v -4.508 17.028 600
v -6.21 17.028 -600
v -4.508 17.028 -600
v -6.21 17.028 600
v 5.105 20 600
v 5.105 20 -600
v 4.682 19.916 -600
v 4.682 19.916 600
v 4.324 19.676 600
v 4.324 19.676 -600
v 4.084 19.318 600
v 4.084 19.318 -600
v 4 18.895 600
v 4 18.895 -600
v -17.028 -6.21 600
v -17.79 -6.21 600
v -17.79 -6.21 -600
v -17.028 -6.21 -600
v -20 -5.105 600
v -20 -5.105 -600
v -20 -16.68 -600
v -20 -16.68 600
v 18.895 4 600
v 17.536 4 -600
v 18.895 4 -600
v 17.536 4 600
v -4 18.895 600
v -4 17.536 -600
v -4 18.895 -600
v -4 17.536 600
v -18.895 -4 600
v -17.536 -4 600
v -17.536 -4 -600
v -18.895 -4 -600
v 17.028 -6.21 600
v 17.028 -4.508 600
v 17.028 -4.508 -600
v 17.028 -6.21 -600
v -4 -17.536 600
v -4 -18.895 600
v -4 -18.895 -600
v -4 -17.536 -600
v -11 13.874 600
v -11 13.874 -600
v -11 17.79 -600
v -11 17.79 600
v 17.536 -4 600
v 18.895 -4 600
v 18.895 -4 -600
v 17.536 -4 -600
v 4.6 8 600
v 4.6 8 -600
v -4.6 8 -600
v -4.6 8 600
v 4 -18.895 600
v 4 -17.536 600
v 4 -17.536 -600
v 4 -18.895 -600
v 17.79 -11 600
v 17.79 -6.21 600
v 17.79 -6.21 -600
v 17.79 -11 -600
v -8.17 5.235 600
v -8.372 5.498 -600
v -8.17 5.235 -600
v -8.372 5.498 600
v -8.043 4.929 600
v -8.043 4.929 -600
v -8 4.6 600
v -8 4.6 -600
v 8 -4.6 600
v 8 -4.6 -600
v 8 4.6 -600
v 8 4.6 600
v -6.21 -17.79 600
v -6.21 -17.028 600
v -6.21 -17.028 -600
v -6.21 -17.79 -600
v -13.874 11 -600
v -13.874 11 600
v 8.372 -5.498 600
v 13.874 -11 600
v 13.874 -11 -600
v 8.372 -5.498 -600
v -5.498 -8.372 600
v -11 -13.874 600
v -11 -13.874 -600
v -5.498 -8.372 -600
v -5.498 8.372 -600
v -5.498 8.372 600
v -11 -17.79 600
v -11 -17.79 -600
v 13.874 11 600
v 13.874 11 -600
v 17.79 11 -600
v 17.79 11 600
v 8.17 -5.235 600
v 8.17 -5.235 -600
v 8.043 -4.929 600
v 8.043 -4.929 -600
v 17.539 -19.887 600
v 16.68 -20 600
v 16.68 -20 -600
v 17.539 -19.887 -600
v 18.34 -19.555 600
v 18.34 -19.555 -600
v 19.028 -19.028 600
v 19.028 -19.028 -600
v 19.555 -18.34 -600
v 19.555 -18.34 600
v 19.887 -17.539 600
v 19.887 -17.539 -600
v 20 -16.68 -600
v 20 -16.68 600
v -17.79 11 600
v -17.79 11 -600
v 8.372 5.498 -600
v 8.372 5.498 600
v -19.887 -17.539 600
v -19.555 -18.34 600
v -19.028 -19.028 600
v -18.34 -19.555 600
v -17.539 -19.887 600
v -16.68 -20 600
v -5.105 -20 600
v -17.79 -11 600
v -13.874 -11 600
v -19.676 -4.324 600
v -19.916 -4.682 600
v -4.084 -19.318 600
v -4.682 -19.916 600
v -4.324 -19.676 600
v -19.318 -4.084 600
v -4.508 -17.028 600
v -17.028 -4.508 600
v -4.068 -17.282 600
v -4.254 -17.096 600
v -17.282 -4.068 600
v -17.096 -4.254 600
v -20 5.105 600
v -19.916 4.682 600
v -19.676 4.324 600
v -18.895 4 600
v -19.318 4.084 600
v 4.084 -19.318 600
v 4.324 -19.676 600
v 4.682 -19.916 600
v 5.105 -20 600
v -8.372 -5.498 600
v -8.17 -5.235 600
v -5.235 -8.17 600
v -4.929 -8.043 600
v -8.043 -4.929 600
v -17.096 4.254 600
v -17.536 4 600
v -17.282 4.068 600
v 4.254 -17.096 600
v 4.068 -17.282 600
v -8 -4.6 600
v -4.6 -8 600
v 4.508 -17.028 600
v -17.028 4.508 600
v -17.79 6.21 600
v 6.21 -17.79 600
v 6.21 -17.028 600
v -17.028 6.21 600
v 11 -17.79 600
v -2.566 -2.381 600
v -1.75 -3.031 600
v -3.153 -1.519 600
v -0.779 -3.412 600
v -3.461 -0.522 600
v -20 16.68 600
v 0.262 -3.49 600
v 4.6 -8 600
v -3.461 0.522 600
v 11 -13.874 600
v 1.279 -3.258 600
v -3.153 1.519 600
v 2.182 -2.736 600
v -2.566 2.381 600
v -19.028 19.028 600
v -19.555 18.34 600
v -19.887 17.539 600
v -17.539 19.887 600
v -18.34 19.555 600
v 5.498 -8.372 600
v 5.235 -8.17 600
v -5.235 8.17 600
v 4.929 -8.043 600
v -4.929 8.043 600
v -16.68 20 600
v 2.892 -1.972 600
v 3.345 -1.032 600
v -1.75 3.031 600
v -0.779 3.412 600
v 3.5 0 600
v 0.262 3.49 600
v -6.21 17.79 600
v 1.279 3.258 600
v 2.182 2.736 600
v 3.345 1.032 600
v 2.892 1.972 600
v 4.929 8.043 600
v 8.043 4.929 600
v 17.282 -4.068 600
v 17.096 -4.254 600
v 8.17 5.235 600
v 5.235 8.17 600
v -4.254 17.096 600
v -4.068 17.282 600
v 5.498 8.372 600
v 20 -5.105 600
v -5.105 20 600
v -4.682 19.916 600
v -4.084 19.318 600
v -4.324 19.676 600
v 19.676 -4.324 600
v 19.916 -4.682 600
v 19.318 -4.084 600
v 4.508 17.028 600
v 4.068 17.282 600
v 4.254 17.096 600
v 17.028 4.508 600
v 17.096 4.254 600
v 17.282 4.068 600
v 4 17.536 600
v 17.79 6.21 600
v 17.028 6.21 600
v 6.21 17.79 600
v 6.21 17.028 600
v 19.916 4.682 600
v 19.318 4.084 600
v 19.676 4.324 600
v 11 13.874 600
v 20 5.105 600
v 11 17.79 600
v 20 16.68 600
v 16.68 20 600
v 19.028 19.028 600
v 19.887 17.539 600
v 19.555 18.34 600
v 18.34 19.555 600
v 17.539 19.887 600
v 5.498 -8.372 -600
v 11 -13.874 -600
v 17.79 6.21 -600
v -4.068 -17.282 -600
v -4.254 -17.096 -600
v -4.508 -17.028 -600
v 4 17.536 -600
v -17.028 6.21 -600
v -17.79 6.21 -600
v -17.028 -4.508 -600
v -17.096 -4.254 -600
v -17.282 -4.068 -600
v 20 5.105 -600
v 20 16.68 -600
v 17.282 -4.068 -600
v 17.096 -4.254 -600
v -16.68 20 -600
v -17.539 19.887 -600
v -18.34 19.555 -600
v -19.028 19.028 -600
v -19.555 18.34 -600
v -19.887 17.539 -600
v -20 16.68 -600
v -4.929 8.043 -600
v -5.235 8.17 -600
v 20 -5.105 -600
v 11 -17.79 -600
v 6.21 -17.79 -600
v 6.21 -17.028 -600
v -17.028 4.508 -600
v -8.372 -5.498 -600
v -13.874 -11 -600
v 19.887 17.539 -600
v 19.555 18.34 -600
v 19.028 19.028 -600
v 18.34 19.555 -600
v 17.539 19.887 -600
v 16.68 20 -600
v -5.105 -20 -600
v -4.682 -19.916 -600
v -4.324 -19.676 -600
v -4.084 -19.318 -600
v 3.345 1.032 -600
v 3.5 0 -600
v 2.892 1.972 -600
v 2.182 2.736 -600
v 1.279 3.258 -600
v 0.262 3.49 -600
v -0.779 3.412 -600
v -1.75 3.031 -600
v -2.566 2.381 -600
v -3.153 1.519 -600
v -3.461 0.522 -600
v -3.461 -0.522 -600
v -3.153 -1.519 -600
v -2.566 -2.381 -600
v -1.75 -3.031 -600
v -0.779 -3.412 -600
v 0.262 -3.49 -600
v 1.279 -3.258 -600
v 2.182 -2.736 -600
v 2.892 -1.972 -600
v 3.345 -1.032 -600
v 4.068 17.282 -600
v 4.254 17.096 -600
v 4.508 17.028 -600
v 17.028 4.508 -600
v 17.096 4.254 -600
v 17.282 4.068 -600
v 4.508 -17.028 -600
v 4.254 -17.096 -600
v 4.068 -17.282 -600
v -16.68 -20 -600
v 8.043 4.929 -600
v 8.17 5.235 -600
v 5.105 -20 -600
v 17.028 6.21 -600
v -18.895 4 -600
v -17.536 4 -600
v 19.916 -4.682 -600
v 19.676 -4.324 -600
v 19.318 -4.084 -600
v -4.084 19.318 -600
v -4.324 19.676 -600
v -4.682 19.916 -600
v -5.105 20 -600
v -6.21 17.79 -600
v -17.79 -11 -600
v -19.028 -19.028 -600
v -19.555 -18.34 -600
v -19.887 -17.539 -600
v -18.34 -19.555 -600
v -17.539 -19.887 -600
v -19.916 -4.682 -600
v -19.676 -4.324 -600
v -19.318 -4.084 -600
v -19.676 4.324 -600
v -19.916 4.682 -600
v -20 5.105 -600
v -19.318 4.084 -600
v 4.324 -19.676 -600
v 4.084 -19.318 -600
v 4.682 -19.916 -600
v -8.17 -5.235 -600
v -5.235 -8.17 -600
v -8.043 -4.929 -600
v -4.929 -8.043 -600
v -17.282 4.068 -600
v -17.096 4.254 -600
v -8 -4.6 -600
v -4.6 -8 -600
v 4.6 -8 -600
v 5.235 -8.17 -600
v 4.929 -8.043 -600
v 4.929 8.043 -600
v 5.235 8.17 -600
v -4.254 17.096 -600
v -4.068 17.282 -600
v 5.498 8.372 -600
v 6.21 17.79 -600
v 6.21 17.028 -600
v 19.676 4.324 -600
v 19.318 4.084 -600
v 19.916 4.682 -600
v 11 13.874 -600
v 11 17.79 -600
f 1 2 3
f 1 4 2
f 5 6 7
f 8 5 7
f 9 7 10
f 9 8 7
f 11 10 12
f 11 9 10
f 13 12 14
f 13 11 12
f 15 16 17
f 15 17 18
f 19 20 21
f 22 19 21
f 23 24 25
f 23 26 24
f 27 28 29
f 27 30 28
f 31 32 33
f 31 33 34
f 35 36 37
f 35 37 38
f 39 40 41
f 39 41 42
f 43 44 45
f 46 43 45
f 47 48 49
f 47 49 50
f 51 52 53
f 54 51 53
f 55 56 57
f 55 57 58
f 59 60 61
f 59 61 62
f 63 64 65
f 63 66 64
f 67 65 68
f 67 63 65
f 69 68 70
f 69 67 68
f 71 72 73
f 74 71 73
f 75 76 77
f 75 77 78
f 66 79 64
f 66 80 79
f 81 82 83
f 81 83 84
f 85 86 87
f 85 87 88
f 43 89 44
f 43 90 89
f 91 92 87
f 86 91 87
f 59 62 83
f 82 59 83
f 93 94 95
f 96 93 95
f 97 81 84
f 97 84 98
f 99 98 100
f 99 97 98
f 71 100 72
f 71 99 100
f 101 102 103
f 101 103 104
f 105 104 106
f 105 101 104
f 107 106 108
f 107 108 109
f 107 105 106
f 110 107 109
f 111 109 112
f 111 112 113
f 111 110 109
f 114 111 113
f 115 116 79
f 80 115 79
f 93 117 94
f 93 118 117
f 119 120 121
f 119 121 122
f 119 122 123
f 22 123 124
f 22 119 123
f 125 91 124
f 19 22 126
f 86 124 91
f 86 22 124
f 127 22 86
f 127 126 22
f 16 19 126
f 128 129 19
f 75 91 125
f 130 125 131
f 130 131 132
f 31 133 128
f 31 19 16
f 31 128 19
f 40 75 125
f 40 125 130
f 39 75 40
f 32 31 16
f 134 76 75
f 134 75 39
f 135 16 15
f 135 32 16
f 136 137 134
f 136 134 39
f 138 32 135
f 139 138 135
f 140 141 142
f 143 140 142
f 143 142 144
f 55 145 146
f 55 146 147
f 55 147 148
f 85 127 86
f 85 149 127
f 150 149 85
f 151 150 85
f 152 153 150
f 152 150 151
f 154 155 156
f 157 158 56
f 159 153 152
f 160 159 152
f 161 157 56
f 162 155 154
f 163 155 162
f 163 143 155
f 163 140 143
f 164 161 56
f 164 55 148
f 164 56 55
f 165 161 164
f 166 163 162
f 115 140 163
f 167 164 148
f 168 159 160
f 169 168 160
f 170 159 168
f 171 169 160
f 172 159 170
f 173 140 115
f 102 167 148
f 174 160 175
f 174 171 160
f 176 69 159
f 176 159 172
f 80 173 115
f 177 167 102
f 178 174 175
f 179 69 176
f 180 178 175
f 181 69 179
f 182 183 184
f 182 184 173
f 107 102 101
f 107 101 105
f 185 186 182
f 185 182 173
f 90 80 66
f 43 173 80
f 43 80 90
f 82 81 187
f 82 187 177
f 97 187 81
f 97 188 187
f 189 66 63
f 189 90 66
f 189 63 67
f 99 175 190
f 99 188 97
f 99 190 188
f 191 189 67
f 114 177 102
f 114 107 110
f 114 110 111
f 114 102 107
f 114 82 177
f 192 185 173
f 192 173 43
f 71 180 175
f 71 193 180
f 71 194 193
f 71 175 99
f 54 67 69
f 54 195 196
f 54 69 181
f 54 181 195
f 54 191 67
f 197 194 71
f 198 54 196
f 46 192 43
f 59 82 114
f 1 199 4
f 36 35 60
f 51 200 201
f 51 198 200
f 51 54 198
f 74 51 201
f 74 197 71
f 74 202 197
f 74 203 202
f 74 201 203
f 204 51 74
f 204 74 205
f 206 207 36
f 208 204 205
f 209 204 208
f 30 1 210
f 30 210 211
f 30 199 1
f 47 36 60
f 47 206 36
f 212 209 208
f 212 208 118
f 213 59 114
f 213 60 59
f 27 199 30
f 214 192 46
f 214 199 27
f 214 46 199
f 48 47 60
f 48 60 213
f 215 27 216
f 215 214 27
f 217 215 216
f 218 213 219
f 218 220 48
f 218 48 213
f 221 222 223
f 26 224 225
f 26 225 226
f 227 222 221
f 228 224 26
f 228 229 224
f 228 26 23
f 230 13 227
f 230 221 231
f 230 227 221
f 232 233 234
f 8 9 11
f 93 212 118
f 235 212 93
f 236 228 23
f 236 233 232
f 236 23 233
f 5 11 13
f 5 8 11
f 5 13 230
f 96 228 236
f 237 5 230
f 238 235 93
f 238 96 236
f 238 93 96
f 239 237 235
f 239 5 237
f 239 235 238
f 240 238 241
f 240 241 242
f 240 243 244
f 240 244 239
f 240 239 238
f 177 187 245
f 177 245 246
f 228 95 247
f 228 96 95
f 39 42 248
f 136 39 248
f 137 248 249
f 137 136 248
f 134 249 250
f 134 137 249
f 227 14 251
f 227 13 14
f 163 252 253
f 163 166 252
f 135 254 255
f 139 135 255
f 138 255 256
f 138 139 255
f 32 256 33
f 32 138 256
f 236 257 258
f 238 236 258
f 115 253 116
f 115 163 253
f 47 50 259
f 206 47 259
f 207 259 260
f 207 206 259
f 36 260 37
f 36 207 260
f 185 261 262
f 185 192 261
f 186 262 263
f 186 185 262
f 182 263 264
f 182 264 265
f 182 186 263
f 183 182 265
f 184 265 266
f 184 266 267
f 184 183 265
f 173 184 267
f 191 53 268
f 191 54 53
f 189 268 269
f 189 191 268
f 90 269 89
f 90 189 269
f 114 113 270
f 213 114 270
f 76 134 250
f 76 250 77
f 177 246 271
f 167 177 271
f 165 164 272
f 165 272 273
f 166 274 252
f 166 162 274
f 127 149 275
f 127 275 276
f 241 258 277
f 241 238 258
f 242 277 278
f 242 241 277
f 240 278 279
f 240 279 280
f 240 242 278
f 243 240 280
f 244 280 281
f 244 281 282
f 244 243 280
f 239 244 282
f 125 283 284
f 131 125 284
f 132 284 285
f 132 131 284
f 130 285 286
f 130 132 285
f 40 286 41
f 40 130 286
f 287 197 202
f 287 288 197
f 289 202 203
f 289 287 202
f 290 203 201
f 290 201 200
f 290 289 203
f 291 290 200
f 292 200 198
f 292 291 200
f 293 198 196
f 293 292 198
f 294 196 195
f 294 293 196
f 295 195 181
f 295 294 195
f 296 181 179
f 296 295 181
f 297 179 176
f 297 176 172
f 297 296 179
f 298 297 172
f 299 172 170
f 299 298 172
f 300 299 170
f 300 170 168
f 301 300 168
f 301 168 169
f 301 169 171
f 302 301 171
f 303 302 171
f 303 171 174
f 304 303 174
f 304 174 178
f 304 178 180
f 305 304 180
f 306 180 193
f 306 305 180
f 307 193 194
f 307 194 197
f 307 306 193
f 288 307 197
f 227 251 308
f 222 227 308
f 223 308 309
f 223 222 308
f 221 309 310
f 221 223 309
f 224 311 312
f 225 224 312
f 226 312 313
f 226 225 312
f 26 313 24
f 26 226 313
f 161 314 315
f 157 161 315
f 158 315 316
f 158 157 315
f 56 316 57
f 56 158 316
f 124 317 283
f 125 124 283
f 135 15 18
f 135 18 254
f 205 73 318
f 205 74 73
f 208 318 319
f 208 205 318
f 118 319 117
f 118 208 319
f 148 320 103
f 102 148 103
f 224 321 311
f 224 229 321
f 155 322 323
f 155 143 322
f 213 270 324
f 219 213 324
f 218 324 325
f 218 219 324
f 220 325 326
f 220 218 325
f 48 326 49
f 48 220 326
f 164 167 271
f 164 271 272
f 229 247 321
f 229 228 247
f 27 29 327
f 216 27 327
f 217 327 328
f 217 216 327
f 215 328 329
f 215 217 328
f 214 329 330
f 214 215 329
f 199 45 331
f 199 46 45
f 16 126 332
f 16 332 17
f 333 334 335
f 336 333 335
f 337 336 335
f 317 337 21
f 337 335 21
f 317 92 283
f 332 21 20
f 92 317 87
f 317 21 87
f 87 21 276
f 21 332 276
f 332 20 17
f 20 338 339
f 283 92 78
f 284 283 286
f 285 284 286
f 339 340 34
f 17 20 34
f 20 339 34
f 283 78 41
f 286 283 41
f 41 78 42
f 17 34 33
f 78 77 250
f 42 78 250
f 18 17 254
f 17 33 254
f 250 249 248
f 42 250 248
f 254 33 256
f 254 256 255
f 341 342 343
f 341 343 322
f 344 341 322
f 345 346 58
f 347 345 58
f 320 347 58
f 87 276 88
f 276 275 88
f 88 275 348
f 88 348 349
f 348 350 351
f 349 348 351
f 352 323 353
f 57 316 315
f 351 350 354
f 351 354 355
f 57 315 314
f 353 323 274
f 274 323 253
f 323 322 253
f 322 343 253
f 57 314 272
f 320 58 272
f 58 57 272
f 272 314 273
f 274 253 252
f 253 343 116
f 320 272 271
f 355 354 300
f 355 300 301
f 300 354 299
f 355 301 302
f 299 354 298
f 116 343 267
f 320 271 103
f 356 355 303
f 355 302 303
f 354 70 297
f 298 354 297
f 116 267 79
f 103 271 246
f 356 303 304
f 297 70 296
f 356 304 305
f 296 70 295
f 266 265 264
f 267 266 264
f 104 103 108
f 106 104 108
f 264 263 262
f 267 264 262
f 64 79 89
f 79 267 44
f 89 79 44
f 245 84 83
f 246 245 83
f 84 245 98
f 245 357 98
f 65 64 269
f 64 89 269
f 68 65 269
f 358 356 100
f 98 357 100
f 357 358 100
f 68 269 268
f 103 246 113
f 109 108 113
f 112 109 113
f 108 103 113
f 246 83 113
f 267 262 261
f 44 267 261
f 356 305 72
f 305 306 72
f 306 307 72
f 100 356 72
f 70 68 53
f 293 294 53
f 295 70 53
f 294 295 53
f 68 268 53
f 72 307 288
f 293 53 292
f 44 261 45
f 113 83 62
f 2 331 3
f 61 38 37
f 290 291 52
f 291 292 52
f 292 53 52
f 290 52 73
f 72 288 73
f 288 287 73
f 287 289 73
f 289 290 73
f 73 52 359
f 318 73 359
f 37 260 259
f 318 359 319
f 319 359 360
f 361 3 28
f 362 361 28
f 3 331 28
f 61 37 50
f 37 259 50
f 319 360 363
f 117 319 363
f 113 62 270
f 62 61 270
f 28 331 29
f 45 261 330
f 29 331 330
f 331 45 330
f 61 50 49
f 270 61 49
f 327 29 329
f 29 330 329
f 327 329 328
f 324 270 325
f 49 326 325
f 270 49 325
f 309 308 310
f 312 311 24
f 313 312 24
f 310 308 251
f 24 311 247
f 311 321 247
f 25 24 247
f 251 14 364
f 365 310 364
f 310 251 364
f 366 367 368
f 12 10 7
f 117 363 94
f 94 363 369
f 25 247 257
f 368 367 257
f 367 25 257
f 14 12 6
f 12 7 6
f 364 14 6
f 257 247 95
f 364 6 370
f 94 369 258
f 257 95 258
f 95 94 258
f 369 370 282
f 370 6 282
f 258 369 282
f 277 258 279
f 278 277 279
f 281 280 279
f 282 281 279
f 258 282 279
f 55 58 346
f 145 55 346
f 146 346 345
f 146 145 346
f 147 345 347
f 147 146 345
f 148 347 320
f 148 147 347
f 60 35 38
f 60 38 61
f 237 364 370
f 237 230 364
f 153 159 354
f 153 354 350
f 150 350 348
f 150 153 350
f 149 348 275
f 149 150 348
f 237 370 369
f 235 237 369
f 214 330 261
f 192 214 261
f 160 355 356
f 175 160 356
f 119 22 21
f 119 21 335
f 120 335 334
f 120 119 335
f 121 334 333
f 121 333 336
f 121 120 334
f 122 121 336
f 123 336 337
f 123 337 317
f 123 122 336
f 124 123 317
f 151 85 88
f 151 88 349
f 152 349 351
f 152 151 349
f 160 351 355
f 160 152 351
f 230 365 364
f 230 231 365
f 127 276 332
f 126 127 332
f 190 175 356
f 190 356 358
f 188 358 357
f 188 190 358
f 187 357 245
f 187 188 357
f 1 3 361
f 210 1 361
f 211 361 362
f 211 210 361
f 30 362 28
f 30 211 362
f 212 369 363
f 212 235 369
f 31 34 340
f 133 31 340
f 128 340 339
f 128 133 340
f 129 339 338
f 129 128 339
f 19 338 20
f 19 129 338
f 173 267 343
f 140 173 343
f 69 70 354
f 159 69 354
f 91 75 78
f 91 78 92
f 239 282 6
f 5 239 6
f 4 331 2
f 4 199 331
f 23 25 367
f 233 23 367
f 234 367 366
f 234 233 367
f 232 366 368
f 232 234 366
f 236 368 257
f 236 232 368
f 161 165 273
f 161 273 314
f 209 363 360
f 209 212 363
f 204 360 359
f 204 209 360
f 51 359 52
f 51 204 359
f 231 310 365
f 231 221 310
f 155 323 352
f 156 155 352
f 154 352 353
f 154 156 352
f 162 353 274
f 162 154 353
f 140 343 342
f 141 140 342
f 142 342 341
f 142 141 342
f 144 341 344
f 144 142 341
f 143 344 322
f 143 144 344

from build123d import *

# Parameters (mm, degrees)
SKETCH1_R           = 3.5
BOSS_EXTRUDE1_DEPTH = 600


with BuildPart() as part:
    # Sketch1 → Boss-Extrude1 (new, symmetric)
    with BuildSketch(Plane.XY):
        with BuildLine():
            Line((-8, 4.600266817), (-8, -4.600266817))
            ThreePointArc((-8, -4.600266817), (-8.096672994, -5.086274776), (-8.371974388, -5.498292429))
            Line((-8.371974388, -5.498292429), (-13.873681959, -11))
            Line((-13.873681959, -11), (-17.7902, -11))
            Line((-17.7902, -11), (-17.7902, -6.2098))
            Line((-17.7902, -6.2098), (-17.0282, -6.2098))
            Line((-17.0282, -6.2098), (-17.0282, -4.508))
            ThreePointArc((-17.0282, -4.508), (-17.176989755, -4.148789755), (-17.5362, -4))
            Line((-17.5362, -4), (-18.8951, -4))
            ThreePointArc((-18.8951, -4), (-19.676382283, -4.323617717), (-20, -5.1049))
            Line((-20, -5.1049), (-20, -16.68))
            ThreePointArc((-20, -16.68), (-19.027594514, -19.027594514), (-16.68, -20))
            Line((-16.68, -20), (-5.1049, -20))
            ThreePointArc((-5.1049, -20), (-4.323617717, -19.676382283), (-4, -18.8951))
            Line((-4, -18.8951), (-4, -17.5362))
            ThreePointArc((-4, -17.5362), (-4.148789755, -17.176989755), (-4.508, -17.0282))
            Line((-4.508, -17.0282), (-6.2098, -17.0282))
            Line((-6.2098, -17.0282), (-6.2098, -17.7902))
            Line((-6.2098, -17.7902), (-11, -17.7902))
            Line((-11, -17.7902), (-11, -13.873681959))
            Line((-11, -13.873681959), (-5.498292429, -8.371974388))
            ThreePointArc((-5.498292429, -8.371974388), (-5.086274776, -8.096672994), (-4.600266817, -8))
            Line((-4.600266817, -8), (4.600266817, -8))
            ThreePointArc((4.600266817, -8), (5.086274776, -8.096672994), (5.498292429, -8.371974388))
            Line((5.498292429, -8.371974388), (11, -13.873681959))
            Line((11, -13.873681959), (11, -17.7902))
            Line((11, -17.7902), (6.2098, -17.7902))
            Line((6.2098, -17.7902), (6.2098, -17.0282))
            Line((6.2098, -17.0282), (4.508, -17.0282))
            ThreePointArc((4.508, -17.0282), (4.148789755, -17.176989755), (4, -17.5362))
            Line((4, -17.5362), (4, -18.8951))
            ThreePointArc((4, -18.8951), (4.323617717, -19.676382283), (5.1049, -20))
            Line((5.1049, -20), (16.68, -20))
            ThreePointArc((16.68, -20), (19.027594514, -19.027594514), (20, -16.68))
            Line((20, -16.68), (20, -5.1049))
            ThreePointArc((20, -5.1049), (19.676382283, -4.323617717), (18.8951, -4))
            Line((18.8951, -4), (17.5362, -4))
            ThreePointArc((17.5362, -4), (17.176989755, -4.148789755), (17.0282, -4.508))
            Line((17.0282, -4.508), (17.0282, -6.2098))
            Line((17.0282, -6.2098), (17.7902, -6.2098))
            Line((17.7902, -6.2098), (17.7902, -11))
            Line((17.7902, -11), (13.873681959, -11))
            Line((13.873681959, -11), (8.371974388, -5.498292429))
            ThreePointArc((8.371974388, -5.498292429), (8.096672994, -5.086274776), (8, -4.600266817))
            Line((8, -4.600266817), (8, 4.600266817))
            ThreePointArc((8, 4.600266817), (8.096672994, 5.086274776), (8.371974388, 5.498292429))
            Line((8.371974388, 5.498292429), (13.873681959, 11))
            Line((13.873681959, 11), (17.7902, 11))
            Line((17.7902, 11), (17.7902, 6.2098))
            Line((17.7902, 6.2098), (17.0282, 6.2098))
            Line((17.0282, 6.2098), (17.0282, 4.508))
            ThreePointArc((17.0282, 4.508), (17.176989755, 4.148789755), (17.5362, 4))
            Line((17.5362, 4), (18.8951, 4))
            ThreePointArc((18.8951, 4), (19.676382283, 4.323617717), (20, 5.1049))
            Line((20, 5.1049), (20, 16.68))
            ThreePointArc((20, 16.68), (19.027594514, 19.027594514), (16.68, 20))
            Line((16.68, 20), (5.1049, 20))
            ThreePointArc((5.1049, 20), (4.323617717, 19.676382283), (4, 18.8951))
            Line((4, 18.8951), (4, 17.5362))
            ThreePointArc((4, 17.5362), (4.148789755, 17.176989755), (4.508, 17.0282))
            Line((4.508, 17.0282), (6.2098, 17.0282))
            Line((6.2098, 17.0282), (6.2098, 17.7902))
            Line((6.2098, 17.7902), (11, 17.7902))
            Line((11, 17.7902), (11, 13.873681959))
            Line((11, 13.873681959), (5.498292429, 8.371974388))
            ThreePointArc((5.498292429, 8.371974388), (5.086274776, 8.096672994), (4.600266817, 8))
            Line((4.600266817, 8), (-4.600266817, 8))
            ThreePointArc((-4.600266817, 8), (-5.086274776, 8.096672994), (-5.498292429, 8.371974388))
            Line((-5.498292429, 8.371974388), (-11, 13.873681959))
            Line((-11, 13.873681959), (-11, 17.7902))
            Line((-11, 17.7902), (-6.2098, 17.7902))
            Line((-6.2098, 17.7902), (-6.2098, 17.0282))
            Line((-6.2098, 17.0282), (-4.508, 17.0282))
            ThreePointArc((-4.508, 17.0282), (-4.148789755, 17.176989755), (-4, 17.5362))
            Line((-4, 17.5362), (-4, 18.8951))
            ThreePointArc((-4, 18.8951), (-4.323617717, 19.676382283), (-5.1049, 20))
            Line((-5.1049, 20), (-16.68, 20))
            ThreePointArc((-16.68, 20), (-19.027594514, 19.027594514), (-20, 16.68))
            Line((-20, 16.68), (-20, 5.1049))
            ThreePointArc((-20, 5.1049), (-19.676382283, 4.323617717), (-18.8951, 4))
            Line((-18.8951, 4), (-17.5362, 4))
            ThreePointArc((-17.5362, 4), (-17.176989755, 4.148789755), (-17.0282, 4.508))
            Line((-17.0282, 4.508), (-17.0282, 6.2098))
            Line((-17.0282, 6.2098), (-17.7902, 6.2098))
            Line((-17.7902, 6.2098), (-17.7902, 11))
            Line((-17.7902, 11), (-13.873681959, 11))
            Line((-13.873681959, 11), (-8.371974388, 5.498292429))
            ThreePointArc((-8.371974388, 5.498292429), (-8.096672994, 5.086274776), (-8, 4.600266817))
        make_face()
        Circle(SKETCH1_R, mode=Mode.SUBTRACT)
    extrude(amount=BOSS_EXTRUDE1_DEPTH, both=True)


solid = part.part
